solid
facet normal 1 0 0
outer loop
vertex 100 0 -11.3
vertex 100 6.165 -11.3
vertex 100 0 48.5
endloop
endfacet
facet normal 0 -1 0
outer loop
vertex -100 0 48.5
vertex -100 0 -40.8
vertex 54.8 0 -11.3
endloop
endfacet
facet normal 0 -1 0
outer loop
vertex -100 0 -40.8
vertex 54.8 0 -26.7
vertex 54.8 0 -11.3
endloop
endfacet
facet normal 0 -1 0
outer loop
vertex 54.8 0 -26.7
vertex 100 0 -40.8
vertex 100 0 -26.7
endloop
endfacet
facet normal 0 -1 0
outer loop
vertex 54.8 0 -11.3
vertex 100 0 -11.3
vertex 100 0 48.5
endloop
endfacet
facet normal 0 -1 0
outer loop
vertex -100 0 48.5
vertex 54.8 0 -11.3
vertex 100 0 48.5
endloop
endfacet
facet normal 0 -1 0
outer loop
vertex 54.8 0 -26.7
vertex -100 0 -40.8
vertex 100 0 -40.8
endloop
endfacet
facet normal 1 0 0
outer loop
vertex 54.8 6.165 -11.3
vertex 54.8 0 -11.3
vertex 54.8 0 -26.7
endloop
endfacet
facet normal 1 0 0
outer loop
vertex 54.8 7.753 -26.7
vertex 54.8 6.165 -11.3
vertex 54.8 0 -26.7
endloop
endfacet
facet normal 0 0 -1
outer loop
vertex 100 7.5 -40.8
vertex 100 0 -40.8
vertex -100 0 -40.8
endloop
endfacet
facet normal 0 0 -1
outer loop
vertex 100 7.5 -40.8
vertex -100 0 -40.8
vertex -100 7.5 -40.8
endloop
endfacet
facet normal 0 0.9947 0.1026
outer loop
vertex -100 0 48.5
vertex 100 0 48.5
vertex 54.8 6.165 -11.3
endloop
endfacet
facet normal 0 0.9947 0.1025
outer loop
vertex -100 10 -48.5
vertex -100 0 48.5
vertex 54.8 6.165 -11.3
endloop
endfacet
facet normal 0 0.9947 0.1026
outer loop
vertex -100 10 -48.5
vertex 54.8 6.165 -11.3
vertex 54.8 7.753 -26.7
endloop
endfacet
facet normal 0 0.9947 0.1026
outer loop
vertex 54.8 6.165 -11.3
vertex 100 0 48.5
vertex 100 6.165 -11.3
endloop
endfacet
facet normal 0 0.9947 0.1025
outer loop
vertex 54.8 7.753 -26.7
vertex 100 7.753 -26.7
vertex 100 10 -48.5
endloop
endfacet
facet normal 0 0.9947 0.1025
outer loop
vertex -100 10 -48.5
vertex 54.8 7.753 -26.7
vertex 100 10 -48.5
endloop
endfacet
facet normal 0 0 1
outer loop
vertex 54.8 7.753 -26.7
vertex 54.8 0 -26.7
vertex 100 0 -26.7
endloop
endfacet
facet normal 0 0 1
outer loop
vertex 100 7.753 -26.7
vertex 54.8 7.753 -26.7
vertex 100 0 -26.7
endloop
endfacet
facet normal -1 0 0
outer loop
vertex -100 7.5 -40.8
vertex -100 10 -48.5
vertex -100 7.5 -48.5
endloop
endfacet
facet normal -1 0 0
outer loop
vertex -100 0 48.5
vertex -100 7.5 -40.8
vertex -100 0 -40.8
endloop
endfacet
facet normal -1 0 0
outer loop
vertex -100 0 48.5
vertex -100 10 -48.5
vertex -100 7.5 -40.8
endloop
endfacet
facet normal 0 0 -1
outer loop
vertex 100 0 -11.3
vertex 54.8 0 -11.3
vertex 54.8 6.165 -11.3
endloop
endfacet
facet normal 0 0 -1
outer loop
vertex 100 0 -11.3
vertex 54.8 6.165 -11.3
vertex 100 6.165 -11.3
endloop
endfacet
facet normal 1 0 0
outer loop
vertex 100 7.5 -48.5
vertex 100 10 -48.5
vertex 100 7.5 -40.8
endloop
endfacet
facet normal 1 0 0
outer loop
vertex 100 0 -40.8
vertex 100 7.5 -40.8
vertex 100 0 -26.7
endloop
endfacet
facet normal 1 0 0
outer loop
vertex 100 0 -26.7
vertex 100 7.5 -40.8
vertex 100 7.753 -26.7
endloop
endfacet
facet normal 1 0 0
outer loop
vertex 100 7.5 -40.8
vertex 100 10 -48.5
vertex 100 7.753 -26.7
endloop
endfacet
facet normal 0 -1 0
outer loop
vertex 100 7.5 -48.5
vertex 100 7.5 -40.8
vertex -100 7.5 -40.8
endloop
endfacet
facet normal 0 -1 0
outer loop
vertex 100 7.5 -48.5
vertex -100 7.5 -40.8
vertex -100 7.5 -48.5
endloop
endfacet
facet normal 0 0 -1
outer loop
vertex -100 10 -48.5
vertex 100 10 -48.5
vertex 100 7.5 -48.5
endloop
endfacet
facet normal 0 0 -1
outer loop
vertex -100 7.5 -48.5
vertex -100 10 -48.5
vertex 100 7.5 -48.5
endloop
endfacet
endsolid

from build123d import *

# Parameters (mm, degrees)
BOSS_EXTRUDE1_DEPTH = 100
SKETCH3_W           = 7.7
SKETCH3_H           = 7.5
CUT_EXTRUDE1_DEPTH  = 207.039437972
SKETCH6_W           = 45.2
SKETCH6_H           = 15.4
CUT_EXTRUDE2_DEPTH  = 112.589650058


with BuildPart() as part:
    # Sketch1 → Boss-Extrude1 (new, symmetric)
    with BuildSketch(Plane(origin=(0, 0, 0), x_dir=(0, 0, -1), z_dir=(1, 0, 0))):
        Polygon((-48.5, 0), (48.5, 10), (48.5, 0), align=None)
    extrude(amount=BOSS_EXTRUDE1_DEPTH, both=True)

    # Sketch3 → Cut-Extrude1 (cut, through all)
    with BuildSketch(Plane(origin=(100, 0, 0), x_dir=(0, 0, -1), z_dir=(1, 0, 0))):
        with Locations((44.65, 3.75)):
            Rectangle(SKETCH3_W, SKETCH3_H)
    extrude(amount=-CUT_EXTRUDE1_DEPTH, mode=Mode.SUBTRACT)

    # Sketch6 → Cut-Extrude2 (cut, through all)
    with BuildSketch(Plane(origin=(0, 0, 0), x_dir=(1, 0, 0), z_dir=(0, 1, 0))):
        with Locations((77.4, 19)):
            Rectangle(SKETCH6_W, SKETCH6_H)
    extrude(amount=CUT_EXTRUDE2_DEPTH, mode=Mode.SUBTRACT)


solid = part.part
